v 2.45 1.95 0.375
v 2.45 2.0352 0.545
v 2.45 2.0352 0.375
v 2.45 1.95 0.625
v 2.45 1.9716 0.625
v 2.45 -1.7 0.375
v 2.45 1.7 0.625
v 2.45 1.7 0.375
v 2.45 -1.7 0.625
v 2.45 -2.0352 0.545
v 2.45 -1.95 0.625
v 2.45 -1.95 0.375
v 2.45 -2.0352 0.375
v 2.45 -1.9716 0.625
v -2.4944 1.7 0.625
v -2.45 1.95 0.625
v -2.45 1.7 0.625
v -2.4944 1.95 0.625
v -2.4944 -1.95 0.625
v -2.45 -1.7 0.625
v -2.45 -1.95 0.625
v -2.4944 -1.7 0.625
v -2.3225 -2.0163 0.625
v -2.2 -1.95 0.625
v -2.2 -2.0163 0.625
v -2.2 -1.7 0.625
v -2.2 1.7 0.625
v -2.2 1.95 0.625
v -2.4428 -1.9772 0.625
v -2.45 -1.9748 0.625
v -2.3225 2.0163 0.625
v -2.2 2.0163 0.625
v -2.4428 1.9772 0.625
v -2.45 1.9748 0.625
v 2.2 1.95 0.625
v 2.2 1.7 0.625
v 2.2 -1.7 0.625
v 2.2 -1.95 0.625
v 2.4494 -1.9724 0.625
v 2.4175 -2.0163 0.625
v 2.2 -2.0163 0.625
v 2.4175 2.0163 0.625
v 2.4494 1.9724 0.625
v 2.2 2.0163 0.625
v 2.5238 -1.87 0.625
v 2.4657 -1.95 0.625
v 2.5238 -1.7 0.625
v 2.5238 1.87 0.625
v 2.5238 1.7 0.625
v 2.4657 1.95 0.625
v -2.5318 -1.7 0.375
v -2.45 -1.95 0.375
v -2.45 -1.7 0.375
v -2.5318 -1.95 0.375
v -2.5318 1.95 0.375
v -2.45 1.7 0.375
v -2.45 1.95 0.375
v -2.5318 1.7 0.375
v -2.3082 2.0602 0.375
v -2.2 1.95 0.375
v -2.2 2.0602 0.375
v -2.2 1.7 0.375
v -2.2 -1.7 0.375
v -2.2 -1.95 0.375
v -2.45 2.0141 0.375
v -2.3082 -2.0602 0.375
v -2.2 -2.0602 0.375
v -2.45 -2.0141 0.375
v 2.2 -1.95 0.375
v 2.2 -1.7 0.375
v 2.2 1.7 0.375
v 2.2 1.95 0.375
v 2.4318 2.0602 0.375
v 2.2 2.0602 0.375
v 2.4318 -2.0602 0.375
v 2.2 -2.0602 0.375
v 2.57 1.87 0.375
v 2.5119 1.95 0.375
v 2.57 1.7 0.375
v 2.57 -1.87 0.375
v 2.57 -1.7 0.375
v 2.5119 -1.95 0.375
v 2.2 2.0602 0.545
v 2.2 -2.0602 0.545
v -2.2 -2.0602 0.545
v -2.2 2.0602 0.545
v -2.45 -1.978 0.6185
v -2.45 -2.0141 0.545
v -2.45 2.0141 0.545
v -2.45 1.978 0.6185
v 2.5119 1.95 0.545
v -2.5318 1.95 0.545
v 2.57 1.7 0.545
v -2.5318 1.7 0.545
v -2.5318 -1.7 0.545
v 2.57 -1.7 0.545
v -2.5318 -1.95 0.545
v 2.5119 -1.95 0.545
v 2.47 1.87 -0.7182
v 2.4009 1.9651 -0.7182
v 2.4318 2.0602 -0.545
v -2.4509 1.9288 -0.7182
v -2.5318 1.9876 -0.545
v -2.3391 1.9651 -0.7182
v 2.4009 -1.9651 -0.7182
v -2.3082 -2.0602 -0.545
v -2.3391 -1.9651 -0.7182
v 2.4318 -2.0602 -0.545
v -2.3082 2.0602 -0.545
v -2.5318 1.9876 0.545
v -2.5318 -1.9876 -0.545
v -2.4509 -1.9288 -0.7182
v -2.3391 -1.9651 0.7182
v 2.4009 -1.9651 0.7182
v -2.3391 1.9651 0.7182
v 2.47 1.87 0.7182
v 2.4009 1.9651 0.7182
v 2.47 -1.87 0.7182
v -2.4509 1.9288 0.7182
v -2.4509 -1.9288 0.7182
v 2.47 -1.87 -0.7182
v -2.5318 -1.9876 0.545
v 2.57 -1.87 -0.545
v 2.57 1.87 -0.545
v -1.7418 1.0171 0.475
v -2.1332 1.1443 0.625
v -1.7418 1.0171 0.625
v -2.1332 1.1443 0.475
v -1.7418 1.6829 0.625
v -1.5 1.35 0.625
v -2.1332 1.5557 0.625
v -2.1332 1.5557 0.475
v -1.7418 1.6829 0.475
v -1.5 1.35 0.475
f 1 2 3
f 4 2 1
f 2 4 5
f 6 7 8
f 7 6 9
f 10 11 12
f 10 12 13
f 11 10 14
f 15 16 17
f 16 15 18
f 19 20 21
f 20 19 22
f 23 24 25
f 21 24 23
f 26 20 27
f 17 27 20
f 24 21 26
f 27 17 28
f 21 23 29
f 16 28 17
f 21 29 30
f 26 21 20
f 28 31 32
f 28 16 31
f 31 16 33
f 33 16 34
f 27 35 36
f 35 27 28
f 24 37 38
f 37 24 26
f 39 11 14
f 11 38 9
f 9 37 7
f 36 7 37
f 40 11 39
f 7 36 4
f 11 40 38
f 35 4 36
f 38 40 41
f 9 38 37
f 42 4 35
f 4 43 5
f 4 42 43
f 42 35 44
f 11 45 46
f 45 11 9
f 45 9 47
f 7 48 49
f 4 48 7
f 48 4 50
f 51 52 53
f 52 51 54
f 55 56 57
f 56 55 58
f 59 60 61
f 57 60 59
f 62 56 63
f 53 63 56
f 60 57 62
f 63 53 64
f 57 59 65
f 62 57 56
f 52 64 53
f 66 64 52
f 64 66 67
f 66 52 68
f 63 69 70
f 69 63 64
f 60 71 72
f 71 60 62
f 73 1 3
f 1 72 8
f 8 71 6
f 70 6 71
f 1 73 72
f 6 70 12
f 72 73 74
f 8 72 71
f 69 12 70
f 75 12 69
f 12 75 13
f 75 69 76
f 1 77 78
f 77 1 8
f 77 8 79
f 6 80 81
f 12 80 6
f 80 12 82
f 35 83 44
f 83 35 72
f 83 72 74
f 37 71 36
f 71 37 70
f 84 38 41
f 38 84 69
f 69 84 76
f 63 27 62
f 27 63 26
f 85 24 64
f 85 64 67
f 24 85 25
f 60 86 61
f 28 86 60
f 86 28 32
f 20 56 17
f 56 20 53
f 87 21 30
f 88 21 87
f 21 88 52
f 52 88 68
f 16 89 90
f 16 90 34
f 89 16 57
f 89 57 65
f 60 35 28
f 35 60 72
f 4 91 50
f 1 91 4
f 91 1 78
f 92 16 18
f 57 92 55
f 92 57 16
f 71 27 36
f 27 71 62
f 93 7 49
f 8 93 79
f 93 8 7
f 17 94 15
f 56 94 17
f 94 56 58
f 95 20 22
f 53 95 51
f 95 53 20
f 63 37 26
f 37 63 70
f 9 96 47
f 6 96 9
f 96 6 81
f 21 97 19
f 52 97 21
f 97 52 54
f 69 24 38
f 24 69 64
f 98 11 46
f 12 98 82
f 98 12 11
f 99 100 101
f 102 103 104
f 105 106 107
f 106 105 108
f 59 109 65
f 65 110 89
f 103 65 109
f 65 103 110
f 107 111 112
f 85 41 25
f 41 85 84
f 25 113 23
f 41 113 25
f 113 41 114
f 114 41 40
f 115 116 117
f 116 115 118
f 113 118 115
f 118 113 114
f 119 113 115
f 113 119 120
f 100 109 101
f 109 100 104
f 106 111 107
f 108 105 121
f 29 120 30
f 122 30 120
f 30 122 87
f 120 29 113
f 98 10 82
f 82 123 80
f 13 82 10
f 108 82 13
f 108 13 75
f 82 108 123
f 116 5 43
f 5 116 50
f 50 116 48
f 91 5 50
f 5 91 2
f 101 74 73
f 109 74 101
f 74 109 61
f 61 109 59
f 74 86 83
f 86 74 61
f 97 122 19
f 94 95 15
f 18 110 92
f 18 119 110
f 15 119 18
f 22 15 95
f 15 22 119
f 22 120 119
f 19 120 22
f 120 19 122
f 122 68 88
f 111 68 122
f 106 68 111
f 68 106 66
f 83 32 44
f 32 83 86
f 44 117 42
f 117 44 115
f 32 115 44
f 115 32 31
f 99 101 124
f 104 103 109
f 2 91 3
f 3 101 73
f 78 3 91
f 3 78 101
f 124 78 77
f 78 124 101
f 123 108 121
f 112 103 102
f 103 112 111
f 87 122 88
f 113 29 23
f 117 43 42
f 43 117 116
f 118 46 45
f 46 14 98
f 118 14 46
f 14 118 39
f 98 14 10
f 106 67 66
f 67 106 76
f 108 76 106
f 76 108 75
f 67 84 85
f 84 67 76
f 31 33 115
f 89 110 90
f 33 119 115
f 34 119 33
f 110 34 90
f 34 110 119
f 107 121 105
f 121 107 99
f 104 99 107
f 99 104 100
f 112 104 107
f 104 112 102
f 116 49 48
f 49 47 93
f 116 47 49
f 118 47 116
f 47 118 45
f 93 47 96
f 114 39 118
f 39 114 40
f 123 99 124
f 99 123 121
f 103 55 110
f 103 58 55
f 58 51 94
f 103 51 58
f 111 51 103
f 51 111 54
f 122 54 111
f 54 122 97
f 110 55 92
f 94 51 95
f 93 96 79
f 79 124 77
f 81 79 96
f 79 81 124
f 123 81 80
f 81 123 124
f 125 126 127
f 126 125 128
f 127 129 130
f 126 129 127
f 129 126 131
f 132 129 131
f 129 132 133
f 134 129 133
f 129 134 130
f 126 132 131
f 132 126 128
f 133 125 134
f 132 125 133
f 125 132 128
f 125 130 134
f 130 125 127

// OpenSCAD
// Parameters
body_length = 4.9; //[2.45:9.8:0.05]
body_width = 3.9; //[1.95:7.8:0.05]
body_height = 1.25; //[0.6:2.5:0.05]
pad_thickness = 0.08; //[0.04:0.2:0.01]
pad_inset = 0.25; //[0.1:0.8:0.05]
pad_overlap = 0.6; //[0.2:1.2:0.05]
pin1_mark_radius = 0.35; //[0.15:0.8:0.05]
pin1_mark_depth = 0.15; //[0.05:0.4:0.05]
pin1_edge_offset = 0.6; //[0.3:1.2:0.05]
top_chamfer = 0.25; //[0.1:0.6:0.05]
fillet_radius = 0.2; //[0.05:0.6:0.05]
fillet_shrink = 0.4; //[0.2:0.9:0.05]

// Base shapes
module smd_body_base() {
  translate([0, 0, 0])
    cube([body_length - 2*fillet_radius*fillet_shrink, 
          body_width - 2*fillet_radius*fillet_shrink, 
          body_height - 2*fillet_radius*fillet_shrink], center=true);
}

module body_fillet_kernel() {
  translate([0, 0, 0])
    sphere(r=fillet_radius, center=true);
}

module top_chamfer_wedge_x_pos() {
  translate([body_length/2 - top_chamfer/2, 0, body_height/2 - top_chamfer/2])
    cube([top_chamfer, body_width + 2*top_chamfer, top_chamfer], center=true);
}

module top_chamfer_wedge_x_neg() {
  translate([-body_length/2 + top_chamfer/2, 0, body_height/2 - top_chamfer/2])
    cube([top_chamfer, body_width + 2*top_chamfer, top_chamfer], center=true);
}

module top_chamfer_wedge_y_pos() {
  translate([0, body_width/2 - top_chamfer/2, body_height/2 - top_chamfer/2])
    cube([body_length + 2*top_chamfer, top_chamfer, top_chamfer], center=true);
}

module top_chamfer_wedge_y_neg() {
  translate([0, -body_width/2 + top_chamfer/2, body_height/2 - top_chamfer/2])
    cube([body_length + 2*top_chamfer, top_chamfer, top_chamfer], center=true);
}

module pin1_mark_cutter() {
  translate([-body_length/2 + pin1_edge_offset, body_width/2 - pin1_edge_offset, body_height/2 - pin1_mark_depth/2])
    cylinder(r=pin1_mark_radius, h=pin1_mark_depth, center=true);
}

module pad_left() {
  translate([-(body_length/2) + (body_length/2 - pad_inset + pad_overlap)/2, 0, -body_height/2 + pad_thickness/2])
    cube([body_length/2 - pad_inset + pad_overlap, body_width - 2*pad_inset, pad_thickness], center=true);
}

module pad_right() {
  translate([(body_length/2) - (body_length/2 - pad_inset + pad_overlap)/2, 0, -body_height/2 + pad_thickness/2])
    cube([body_length/2 - pad_inset + pad_overlap, body_width - 2*pad_inset, pad_thickness], center=true);
}

// Operations
module body_fillet() {
  minkowski() {
    smd_body_base();
    body_fillet_kernel();
  }
}

module top_chamfer_cutters() {
  union() {
    top_chamfer_wedge_x_pos();
    top_chamfer_wedge_x_neg();
    top_chamfer_wedge_y_pos();
    top_chamfer_wedge_y_neg();
  }
}

module smd_body_chamfered() {
  difference() {
    body_fillet();
    top_chamfer_cutters();
  }
}

module pin1_mark() {
  difference() {
    smd_body_chamfered();
    pin1_mark_cutter();
  }
}

module pads() {
  union() {
    pad_left();
    pad_right();
  }
}

module complete_model() {
  union() {
    pin1_mark();
    pads();
  }
}

// Final output
complete_model();
